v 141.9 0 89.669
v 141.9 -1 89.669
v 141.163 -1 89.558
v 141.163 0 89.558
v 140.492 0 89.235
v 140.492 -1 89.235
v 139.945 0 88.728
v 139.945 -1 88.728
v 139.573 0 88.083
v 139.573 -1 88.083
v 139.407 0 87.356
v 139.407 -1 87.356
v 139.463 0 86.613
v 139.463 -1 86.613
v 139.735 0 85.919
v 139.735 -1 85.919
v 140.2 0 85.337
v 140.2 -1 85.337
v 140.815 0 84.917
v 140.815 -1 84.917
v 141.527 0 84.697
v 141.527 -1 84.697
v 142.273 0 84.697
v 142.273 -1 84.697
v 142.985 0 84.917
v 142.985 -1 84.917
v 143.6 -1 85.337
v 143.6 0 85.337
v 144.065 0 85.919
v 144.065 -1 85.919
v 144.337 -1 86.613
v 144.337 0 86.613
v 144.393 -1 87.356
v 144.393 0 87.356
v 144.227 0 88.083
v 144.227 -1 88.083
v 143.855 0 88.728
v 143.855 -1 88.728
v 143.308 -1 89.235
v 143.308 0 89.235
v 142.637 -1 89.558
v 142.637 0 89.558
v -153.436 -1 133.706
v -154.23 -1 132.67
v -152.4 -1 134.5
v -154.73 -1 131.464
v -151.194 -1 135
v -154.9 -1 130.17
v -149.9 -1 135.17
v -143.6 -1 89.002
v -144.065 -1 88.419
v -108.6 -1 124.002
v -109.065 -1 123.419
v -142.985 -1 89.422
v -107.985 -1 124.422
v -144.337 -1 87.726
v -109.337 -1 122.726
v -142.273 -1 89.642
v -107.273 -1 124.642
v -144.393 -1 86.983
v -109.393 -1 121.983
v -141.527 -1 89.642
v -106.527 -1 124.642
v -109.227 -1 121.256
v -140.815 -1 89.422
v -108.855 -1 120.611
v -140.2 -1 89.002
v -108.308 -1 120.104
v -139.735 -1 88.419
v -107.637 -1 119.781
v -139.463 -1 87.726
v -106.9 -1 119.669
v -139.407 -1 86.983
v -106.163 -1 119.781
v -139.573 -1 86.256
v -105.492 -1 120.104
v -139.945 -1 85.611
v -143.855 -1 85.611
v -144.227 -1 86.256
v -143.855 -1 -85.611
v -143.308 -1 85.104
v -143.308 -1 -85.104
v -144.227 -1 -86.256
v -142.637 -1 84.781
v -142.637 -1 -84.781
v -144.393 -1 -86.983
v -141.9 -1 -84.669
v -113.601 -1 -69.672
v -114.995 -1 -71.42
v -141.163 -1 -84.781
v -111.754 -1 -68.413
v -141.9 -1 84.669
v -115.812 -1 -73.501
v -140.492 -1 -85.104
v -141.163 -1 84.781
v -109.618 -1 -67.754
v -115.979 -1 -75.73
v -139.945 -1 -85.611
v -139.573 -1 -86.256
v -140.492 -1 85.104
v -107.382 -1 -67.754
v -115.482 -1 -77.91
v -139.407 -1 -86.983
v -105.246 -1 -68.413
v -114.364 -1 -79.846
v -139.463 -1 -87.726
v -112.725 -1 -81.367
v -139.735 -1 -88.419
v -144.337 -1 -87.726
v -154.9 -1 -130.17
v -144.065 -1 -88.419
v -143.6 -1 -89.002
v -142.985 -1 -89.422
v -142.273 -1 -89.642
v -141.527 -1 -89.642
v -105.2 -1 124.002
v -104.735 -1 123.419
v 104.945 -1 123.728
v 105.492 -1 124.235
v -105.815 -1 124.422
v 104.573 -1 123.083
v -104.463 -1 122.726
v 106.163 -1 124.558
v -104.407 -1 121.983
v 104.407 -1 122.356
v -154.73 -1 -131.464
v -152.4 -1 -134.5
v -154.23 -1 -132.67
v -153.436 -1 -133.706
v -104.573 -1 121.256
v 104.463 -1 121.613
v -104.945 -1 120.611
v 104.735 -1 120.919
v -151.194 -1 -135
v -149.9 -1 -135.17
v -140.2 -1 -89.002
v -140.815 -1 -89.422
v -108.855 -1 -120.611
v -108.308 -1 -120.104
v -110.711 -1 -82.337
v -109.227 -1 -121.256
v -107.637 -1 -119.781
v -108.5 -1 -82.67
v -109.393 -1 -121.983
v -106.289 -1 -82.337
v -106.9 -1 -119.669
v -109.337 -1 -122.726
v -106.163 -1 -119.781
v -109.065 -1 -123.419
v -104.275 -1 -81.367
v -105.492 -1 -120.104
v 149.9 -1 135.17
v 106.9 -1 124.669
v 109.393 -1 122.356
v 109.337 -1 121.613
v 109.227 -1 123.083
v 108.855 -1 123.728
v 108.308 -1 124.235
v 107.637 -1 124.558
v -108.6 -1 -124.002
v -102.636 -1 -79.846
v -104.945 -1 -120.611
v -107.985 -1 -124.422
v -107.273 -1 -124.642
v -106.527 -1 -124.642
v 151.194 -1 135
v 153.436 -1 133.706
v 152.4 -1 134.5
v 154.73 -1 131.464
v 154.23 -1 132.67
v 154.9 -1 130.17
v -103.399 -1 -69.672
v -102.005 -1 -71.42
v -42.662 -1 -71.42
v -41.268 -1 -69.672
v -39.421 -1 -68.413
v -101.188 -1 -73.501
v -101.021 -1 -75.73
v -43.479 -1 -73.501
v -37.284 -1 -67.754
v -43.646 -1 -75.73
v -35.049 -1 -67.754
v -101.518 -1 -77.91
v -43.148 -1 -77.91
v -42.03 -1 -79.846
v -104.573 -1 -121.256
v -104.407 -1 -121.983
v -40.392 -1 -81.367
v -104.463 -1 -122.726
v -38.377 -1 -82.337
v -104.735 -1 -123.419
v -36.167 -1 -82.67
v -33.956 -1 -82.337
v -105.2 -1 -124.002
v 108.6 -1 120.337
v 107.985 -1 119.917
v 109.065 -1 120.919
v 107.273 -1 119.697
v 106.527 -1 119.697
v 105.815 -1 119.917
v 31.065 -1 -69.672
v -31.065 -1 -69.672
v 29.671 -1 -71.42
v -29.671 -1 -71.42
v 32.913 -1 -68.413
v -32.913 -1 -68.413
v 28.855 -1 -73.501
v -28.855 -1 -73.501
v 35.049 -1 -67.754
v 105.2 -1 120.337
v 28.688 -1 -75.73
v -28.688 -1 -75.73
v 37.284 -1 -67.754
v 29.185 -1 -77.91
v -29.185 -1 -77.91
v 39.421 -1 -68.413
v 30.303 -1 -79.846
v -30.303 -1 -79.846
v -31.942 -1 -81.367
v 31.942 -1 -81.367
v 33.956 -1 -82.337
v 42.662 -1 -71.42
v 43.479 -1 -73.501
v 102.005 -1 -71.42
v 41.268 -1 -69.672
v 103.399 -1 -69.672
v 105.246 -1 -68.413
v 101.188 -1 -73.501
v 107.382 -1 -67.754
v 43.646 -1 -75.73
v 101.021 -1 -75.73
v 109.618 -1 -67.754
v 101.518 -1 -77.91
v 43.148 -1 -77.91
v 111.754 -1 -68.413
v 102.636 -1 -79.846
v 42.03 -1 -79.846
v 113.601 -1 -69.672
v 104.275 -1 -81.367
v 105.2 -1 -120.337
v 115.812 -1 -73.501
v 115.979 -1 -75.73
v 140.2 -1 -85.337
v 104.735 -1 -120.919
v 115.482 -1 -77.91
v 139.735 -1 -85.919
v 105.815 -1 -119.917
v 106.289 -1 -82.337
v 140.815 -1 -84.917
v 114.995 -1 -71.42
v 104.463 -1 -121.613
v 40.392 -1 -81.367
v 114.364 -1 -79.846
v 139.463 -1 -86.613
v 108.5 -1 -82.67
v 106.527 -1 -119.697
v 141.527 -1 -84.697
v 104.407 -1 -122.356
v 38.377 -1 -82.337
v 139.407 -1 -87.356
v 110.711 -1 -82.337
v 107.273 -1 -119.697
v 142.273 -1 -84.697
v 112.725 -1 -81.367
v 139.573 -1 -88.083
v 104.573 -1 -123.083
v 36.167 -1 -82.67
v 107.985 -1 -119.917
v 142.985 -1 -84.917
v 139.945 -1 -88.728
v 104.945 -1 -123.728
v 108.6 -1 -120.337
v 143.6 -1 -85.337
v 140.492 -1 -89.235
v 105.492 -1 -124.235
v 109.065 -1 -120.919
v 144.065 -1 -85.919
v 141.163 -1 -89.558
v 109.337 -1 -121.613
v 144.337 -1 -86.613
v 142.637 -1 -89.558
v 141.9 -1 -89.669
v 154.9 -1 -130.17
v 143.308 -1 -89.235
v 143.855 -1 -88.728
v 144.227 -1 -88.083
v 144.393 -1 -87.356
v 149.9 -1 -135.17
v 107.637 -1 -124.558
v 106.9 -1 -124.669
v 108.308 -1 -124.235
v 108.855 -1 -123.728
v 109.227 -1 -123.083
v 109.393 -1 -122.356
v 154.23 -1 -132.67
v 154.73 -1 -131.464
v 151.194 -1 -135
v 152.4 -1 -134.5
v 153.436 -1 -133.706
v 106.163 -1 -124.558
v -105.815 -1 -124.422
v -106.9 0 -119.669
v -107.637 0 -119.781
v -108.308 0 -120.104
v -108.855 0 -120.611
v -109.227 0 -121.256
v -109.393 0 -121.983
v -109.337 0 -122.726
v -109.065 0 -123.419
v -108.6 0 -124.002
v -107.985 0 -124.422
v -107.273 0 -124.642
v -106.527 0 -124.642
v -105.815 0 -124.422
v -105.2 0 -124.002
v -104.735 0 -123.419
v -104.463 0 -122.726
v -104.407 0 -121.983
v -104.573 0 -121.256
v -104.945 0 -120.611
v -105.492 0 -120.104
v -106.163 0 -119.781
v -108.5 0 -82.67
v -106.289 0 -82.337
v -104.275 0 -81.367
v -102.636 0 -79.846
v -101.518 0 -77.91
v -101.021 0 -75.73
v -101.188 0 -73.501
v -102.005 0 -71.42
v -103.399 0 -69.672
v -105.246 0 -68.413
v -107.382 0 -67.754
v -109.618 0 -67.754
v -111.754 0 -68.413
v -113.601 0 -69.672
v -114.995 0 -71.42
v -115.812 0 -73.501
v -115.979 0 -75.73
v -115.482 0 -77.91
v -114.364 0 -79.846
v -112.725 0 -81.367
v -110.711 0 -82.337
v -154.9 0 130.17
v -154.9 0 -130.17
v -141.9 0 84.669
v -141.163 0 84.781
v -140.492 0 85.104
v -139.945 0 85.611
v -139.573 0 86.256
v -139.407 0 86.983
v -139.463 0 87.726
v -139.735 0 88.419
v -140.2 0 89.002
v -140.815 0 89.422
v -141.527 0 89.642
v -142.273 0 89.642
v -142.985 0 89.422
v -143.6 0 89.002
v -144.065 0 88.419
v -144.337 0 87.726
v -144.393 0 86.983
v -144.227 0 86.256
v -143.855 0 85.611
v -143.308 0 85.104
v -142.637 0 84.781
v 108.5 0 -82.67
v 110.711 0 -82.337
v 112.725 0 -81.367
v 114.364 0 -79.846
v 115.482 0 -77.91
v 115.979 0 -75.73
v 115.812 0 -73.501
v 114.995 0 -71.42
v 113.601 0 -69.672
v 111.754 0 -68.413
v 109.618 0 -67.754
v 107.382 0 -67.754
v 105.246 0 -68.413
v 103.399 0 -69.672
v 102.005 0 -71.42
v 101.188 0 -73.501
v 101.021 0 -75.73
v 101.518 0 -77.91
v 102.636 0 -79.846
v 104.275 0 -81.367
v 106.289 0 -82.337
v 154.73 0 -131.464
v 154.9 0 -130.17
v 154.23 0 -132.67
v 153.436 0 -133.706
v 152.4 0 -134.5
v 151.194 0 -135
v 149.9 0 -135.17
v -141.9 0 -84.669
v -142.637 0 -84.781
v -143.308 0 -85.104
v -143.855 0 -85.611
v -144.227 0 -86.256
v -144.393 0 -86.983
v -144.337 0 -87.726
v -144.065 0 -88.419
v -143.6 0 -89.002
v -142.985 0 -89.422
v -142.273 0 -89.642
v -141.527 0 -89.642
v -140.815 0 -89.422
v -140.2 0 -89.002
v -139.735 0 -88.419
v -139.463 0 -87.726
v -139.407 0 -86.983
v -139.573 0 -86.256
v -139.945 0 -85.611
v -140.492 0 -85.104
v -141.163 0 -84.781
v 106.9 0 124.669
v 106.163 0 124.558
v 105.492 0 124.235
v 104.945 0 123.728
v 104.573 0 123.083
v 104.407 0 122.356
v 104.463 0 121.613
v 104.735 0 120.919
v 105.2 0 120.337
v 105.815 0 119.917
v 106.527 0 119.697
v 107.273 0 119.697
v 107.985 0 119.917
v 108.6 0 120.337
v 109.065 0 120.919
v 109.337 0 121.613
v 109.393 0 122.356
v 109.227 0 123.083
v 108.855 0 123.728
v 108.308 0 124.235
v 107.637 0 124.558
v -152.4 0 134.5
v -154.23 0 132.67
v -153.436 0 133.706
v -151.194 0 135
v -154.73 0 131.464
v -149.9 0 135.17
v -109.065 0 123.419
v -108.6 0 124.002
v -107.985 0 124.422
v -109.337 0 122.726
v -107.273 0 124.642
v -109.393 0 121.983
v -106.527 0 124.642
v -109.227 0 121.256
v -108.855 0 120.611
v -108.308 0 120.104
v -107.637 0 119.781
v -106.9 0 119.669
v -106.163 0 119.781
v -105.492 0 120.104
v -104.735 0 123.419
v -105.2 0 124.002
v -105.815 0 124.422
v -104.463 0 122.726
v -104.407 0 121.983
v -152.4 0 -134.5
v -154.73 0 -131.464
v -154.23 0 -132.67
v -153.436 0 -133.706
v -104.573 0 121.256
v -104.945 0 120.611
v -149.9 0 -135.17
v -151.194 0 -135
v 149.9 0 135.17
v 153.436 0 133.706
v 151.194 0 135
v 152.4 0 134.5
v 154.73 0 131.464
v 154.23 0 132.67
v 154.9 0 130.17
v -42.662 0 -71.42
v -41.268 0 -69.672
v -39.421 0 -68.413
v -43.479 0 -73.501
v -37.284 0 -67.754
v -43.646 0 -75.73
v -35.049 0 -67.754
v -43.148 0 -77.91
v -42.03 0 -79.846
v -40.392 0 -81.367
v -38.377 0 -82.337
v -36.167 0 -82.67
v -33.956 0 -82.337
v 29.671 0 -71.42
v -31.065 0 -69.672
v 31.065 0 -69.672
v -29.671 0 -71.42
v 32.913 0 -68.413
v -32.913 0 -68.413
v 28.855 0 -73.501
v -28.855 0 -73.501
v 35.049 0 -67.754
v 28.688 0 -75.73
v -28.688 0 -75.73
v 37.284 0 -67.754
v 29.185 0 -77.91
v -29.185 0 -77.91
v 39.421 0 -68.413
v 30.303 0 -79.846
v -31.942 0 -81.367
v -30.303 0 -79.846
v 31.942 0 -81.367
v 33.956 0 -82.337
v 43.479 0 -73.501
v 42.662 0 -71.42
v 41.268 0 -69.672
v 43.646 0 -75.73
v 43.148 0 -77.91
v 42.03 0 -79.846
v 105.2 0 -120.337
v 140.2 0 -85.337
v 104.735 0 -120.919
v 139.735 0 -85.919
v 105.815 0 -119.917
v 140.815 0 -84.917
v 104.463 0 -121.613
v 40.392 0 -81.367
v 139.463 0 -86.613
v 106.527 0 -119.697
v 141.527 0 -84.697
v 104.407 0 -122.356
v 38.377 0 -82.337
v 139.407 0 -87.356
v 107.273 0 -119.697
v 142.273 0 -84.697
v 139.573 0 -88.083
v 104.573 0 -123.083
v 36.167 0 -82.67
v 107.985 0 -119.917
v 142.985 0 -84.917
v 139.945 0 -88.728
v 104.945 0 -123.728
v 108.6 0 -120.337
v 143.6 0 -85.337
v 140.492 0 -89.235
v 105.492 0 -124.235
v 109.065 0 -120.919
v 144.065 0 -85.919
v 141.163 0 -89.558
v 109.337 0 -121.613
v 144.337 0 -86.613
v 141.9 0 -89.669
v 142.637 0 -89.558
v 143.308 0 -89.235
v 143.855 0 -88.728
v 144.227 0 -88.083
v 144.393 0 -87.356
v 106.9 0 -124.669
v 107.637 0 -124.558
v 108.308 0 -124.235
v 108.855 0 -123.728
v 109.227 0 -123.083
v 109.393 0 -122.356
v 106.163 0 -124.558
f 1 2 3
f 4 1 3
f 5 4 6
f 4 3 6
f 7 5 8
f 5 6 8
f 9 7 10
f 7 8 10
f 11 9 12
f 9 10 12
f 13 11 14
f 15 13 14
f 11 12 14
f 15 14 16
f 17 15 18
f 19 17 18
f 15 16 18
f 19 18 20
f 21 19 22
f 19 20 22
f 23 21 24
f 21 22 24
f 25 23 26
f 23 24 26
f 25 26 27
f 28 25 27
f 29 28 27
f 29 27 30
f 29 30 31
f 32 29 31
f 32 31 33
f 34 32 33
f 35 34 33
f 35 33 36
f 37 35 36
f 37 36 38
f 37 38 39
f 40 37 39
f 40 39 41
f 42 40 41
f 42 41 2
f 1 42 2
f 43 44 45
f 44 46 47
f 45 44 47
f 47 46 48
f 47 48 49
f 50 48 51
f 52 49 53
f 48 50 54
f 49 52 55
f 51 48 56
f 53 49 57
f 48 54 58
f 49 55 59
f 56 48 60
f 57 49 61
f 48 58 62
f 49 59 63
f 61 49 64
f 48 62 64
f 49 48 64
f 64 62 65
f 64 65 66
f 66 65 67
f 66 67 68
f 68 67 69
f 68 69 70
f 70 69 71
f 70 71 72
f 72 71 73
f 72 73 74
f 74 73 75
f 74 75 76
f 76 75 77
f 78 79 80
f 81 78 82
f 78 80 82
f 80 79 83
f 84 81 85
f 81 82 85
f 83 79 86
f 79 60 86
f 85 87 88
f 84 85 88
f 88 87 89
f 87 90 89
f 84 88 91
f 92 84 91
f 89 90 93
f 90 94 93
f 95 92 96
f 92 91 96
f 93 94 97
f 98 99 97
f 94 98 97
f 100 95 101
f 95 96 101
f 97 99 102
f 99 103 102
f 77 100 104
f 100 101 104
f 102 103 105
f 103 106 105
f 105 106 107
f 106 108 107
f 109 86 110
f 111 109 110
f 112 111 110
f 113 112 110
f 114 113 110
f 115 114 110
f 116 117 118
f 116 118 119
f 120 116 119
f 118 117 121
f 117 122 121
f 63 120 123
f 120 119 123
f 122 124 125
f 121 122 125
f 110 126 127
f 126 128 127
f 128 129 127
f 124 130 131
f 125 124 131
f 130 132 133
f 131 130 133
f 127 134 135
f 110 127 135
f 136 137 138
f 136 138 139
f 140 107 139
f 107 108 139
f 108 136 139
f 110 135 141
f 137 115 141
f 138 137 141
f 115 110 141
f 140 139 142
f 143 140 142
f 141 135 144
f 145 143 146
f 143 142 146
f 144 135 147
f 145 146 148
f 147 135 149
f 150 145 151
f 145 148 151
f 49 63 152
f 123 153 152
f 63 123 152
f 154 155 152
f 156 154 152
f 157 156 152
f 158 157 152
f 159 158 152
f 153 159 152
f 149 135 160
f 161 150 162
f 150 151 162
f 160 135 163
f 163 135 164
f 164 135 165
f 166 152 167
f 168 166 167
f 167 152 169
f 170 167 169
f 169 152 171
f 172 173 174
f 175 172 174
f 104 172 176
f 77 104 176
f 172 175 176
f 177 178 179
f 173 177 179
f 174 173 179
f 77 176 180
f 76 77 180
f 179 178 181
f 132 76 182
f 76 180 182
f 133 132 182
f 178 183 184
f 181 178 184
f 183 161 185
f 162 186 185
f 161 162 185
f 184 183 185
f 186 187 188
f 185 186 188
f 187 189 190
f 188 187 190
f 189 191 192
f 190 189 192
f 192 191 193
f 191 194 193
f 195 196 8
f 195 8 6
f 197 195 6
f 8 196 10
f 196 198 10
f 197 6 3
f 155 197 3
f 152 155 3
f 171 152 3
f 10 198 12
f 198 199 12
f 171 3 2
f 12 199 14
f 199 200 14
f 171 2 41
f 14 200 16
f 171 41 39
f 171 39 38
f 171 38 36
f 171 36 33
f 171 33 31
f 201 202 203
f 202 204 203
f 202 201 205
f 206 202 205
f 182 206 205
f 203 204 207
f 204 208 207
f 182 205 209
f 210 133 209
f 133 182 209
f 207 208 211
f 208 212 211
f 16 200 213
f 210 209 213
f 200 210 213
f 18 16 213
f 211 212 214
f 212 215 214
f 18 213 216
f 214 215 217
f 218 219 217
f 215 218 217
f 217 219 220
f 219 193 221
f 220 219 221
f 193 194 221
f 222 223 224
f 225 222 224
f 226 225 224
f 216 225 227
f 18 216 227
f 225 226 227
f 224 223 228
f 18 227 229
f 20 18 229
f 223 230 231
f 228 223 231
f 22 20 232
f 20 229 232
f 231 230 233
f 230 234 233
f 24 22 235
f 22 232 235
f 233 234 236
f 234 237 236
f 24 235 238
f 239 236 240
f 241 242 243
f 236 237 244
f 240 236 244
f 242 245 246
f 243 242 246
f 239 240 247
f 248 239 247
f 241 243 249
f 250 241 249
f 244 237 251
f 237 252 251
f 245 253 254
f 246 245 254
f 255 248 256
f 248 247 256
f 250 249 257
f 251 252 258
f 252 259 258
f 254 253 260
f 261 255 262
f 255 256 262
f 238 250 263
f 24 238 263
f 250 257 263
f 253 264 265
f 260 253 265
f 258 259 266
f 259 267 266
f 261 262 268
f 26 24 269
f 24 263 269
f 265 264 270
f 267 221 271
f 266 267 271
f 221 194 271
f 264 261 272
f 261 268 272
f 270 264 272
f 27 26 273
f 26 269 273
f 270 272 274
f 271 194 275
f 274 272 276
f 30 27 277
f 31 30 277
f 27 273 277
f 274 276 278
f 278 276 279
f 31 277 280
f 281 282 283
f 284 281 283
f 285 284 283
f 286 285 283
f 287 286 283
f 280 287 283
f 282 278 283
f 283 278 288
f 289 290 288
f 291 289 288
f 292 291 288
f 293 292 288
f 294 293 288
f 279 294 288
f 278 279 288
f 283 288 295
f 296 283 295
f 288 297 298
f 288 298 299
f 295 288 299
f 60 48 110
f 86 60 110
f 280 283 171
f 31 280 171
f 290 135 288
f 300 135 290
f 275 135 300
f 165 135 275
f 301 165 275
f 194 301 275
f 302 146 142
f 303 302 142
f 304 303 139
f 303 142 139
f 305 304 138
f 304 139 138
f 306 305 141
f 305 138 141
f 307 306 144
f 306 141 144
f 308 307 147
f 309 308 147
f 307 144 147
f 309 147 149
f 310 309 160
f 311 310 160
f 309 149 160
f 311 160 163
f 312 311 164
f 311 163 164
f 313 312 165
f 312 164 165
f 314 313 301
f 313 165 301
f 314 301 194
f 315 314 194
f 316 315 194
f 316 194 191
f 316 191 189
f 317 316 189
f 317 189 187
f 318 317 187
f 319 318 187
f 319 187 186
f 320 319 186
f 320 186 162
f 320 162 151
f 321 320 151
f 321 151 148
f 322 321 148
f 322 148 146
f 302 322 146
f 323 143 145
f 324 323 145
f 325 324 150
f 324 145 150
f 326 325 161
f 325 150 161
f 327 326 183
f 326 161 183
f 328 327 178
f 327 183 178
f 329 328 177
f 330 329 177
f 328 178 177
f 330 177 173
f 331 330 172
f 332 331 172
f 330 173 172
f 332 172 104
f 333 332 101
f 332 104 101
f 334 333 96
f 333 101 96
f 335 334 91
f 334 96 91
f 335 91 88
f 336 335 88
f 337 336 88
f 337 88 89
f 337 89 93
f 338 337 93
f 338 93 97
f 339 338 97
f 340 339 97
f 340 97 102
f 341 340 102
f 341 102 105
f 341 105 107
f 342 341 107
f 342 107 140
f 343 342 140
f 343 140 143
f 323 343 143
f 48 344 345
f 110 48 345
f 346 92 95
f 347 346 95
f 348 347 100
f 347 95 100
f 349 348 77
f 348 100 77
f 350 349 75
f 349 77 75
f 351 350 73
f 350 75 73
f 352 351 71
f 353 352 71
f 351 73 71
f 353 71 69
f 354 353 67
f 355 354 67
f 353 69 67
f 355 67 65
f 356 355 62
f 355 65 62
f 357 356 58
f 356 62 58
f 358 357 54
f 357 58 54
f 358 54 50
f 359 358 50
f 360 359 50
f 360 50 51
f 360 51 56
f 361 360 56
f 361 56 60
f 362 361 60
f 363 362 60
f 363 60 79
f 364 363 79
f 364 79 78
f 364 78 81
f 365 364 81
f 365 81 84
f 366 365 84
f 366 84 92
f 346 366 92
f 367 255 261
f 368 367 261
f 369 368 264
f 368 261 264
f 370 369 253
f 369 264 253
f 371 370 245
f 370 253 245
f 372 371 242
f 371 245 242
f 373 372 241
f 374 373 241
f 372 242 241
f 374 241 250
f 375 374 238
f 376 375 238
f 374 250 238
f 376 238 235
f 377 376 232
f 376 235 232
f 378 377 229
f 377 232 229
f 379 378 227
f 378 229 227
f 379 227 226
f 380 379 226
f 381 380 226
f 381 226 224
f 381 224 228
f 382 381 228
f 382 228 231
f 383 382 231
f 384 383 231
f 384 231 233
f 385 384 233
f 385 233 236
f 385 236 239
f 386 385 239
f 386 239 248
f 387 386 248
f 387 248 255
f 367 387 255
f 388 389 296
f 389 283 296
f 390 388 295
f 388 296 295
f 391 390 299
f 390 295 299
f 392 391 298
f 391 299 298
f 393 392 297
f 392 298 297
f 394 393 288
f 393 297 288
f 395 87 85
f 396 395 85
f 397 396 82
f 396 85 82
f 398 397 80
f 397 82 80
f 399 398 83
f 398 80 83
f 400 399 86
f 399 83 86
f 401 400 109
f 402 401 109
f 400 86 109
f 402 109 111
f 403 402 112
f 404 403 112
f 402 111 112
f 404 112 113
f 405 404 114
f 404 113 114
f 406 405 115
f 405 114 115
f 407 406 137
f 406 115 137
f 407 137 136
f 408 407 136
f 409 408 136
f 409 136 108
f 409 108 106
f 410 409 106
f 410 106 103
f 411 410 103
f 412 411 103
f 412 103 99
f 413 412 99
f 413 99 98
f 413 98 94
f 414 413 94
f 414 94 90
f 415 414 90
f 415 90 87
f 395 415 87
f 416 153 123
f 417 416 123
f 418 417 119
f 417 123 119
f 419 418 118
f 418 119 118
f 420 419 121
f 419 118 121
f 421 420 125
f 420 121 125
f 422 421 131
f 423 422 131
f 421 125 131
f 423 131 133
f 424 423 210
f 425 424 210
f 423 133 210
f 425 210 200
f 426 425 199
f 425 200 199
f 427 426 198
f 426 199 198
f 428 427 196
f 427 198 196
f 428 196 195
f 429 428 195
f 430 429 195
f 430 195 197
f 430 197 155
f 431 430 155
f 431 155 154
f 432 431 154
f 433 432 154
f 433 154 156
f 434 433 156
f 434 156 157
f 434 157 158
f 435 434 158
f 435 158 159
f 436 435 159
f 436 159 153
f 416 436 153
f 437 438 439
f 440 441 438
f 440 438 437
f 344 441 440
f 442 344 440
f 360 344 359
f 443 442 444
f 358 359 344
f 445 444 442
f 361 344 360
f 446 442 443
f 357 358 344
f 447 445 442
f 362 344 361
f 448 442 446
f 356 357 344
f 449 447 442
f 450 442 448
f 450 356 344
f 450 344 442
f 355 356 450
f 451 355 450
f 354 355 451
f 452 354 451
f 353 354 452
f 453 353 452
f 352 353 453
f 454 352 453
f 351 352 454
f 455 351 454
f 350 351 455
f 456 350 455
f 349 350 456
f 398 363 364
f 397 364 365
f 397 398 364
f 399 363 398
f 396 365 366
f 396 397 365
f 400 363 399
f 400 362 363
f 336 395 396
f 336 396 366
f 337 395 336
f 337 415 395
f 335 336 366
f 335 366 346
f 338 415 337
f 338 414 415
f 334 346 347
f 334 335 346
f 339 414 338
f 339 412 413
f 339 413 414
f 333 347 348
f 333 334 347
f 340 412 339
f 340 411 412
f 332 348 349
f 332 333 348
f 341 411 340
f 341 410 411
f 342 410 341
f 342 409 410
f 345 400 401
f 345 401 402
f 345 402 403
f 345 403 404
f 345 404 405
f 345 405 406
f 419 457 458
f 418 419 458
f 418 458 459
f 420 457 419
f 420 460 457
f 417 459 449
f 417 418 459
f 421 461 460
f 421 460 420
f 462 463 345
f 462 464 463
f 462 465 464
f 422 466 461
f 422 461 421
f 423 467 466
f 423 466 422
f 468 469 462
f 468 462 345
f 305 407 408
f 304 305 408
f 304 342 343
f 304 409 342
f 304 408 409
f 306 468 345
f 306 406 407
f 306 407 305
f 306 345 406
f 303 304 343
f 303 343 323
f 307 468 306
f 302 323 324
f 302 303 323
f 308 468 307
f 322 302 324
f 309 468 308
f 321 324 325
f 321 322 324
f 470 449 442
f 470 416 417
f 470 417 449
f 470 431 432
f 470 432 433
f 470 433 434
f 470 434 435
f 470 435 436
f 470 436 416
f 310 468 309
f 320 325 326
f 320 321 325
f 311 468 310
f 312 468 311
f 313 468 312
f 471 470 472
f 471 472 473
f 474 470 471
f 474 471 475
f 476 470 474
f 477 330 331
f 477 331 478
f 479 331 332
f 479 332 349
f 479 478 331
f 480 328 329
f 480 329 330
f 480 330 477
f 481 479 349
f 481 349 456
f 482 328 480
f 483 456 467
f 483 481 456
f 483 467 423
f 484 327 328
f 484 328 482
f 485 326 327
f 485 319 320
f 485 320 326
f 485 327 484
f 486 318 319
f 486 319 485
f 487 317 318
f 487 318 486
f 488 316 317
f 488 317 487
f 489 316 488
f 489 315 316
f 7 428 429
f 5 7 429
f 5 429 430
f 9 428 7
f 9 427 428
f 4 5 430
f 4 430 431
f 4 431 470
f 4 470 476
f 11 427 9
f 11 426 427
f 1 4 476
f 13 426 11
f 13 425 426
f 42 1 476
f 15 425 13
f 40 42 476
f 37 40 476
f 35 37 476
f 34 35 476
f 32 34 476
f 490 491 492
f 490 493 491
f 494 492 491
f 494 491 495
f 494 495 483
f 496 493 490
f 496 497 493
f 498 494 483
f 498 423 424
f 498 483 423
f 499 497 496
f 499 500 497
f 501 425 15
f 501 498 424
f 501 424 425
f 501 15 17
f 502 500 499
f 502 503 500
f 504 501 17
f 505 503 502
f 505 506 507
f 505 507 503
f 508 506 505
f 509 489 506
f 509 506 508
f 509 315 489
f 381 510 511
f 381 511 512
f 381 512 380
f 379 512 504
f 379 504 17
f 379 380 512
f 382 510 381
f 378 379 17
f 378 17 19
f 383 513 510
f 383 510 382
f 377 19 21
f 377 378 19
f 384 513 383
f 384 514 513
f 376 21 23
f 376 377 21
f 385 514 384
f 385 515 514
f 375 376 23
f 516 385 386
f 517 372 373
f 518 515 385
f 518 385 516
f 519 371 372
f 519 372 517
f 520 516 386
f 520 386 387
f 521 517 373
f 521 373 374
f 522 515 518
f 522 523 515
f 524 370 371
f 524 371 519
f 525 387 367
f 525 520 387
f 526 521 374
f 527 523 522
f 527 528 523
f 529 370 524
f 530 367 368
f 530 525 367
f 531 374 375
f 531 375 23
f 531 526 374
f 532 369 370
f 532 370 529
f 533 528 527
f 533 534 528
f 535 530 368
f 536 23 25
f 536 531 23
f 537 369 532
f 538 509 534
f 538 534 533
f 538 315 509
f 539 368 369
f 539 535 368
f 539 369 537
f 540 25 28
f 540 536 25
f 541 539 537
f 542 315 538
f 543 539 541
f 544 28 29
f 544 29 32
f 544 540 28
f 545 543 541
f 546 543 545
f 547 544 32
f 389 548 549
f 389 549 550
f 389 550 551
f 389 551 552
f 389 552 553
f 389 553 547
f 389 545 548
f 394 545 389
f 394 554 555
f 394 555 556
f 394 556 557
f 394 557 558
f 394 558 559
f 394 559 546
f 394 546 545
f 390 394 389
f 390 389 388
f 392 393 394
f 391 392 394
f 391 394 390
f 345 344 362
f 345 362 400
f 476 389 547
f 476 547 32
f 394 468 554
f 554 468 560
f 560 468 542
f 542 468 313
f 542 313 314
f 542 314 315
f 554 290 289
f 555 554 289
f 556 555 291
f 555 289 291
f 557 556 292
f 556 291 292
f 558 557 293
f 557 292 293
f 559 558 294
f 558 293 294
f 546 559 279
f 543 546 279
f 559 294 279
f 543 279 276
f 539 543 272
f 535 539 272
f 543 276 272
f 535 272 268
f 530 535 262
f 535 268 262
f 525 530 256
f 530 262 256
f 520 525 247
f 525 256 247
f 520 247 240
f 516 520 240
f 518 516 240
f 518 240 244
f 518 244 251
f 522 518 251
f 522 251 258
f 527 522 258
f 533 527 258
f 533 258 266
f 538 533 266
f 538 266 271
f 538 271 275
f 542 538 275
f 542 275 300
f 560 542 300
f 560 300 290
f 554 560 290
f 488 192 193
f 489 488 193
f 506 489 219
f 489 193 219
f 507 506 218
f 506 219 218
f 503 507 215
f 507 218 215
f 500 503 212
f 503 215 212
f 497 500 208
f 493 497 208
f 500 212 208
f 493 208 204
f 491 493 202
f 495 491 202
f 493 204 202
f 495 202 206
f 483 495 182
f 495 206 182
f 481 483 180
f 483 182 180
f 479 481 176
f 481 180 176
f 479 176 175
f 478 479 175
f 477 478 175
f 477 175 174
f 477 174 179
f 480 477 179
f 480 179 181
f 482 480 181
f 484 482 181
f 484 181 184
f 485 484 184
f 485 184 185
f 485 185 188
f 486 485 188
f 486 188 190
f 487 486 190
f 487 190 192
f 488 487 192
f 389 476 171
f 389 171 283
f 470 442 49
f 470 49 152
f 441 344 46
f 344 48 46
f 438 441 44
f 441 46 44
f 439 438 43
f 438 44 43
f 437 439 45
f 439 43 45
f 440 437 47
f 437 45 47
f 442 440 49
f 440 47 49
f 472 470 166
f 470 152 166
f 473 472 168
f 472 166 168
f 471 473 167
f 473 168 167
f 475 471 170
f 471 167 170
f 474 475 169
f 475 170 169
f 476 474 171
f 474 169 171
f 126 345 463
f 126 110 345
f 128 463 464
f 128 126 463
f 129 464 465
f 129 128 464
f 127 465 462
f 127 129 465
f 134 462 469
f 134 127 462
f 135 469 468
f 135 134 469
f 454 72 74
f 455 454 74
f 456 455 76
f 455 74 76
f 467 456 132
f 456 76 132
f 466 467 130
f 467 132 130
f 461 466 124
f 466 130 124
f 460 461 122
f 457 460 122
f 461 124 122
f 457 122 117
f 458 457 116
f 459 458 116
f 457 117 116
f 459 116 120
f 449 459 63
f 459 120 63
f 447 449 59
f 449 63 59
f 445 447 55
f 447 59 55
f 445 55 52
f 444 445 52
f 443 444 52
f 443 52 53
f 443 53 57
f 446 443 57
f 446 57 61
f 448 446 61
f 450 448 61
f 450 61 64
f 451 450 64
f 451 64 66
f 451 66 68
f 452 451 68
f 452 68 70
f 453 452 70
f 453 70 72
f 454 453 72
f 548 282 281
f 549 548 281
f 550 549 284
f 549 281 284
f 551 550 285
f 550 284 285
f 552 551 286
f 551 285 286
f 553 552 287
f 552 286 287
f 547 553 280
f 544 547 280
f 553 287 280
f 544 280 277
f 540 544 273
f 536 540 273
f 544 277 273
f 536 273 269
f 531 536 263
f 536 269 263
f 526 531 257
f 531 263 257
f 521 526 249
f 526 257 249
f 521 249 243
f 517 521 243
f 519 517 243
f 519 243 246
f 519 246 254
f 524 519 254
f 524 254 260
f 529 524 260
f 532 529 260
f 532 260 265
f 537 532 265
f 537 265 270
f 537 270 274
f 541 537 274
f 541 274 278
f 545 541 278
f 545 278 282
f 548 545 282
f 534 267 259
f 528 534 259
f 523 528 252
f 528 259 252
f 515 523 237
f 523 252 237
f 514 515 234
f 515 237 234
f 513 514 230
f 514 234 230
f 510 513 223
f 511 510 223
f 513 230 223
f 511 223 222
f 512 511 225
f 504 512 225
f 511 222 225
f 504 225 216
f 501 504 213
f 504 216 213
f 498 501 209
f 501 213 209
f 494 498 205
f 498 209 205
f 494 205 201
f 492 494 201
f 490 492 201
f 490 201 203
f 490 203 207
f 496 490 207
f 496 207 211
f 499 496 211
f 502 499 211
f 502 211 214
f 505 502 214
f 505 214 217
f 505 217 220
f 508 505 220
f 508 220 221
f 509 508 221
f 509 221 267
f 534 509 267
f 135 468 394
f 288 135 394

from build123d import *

# Parameters (mm, degrees)
SKETCH1_W          = 309.8
SKETCH1_H          = 270.34
BASE_FLANGE1_DEPTH = 1
FILLET1_R          = 5
SKETCH2_R          = 2.5
CUT_EXTRUDE1_DEPTH = 10
SKETCH4_R          = 7.5
CUT_EXTRUDE2_DEPTH = 10


# Sheet-metal steps are written as plain solids
with BuildPart() as part:
    # Sketch1 → Base-Flange1 (new body)
    with BuildSketch(Plane(origin=(0, 0, 0), x_dir=(1, 0, 0), z_dir=(0, 1, 0))):
        Rectangle(SKETCH1_W, SKETCH1_H)
    extrude(amount=-BASE_FLANGE1_DEPTH)

    # Fillet1
    fillet1_edges = [part.edges().sort_by_distance(p)[0] for p in [
        (-154.9, -0.5, -135.17),
        (154.9, -0.5, -135.17),
        (154.9, -0.5, 135.17),
        (-154.9, -0.5, 135.17),
    ]]
    fillet(fillet1_edges, radius=FILLET1_R)

    # Sketch2 → Cut-Extrude1 (cut)
    with BuildSketch(Plane.XZ.offset(1)):
        with Locations(Location((-141.9, 87.169485818, 0), (0, 0, 270))):
            Circle(SKETCH2_R)
        with Locations(Location((-106.9, 122.169485818, 0), (0, 0, 270))):
            Circle(SKETCH2_R)
        with Locations(Location((141.9, 87.169485818, 0), (0, 0, 90))):
            Circle(SKETCH2_R)
        with Locations(Location((106.9, 122.169485818, 0), (0, 0, 90))):
            Circle(SKETCH2_R)
        with Locations(Location((141.9, -87.169485818, 0), (0, 0, 270))):
            Circle(SKETCH2_R)
        with Locations(Location((106.9, -122.169485818, 0), (0, 0, 270))):
            Circle(SKETCH2_R)
        with Locations(Location((-141.9, -87.169485818, 0), (0, 0, 90))):
            Circle(SKETCH2_R)
        with Locations(Location((-106.9, -122.169485818, 0), (0, 0, 90))):
            Circle(SKETCH2_R)
    extrude(amount=-CUT_EXTRUDE1_DEPTH, mode=Mode.SUBTRACT)

    # Sketch4 → Cut-Extrude2 (cut)
    with BuildSketch(Plane(origin=(0, -1, 0), x_dir=(-1, 0, 0), z_dir=(0, -1, 0))):
        with Locations(Location((108.5, 75.17, 0), (0, 0, 90))):
            Circle(SKETCH4_R)
        with Locations(Location((36.166666667, 75.17, 0), (0, 0, 90))):
            Circle(SKETCH4_R)
        with Locations(Location((-36.166666667, 75.17, 0), (0, 0, 90))):
            Circle(SKETCH4_R)
        with Locations(Location((-108.5, 75.17, 0), (0, 0, 90))):
            Circle(SKETCH4_R)
    extrude(amount=-CUT_EXTRUDE2_DEPTH, mode=Mode.SUBTRACT)


solid = part.part
